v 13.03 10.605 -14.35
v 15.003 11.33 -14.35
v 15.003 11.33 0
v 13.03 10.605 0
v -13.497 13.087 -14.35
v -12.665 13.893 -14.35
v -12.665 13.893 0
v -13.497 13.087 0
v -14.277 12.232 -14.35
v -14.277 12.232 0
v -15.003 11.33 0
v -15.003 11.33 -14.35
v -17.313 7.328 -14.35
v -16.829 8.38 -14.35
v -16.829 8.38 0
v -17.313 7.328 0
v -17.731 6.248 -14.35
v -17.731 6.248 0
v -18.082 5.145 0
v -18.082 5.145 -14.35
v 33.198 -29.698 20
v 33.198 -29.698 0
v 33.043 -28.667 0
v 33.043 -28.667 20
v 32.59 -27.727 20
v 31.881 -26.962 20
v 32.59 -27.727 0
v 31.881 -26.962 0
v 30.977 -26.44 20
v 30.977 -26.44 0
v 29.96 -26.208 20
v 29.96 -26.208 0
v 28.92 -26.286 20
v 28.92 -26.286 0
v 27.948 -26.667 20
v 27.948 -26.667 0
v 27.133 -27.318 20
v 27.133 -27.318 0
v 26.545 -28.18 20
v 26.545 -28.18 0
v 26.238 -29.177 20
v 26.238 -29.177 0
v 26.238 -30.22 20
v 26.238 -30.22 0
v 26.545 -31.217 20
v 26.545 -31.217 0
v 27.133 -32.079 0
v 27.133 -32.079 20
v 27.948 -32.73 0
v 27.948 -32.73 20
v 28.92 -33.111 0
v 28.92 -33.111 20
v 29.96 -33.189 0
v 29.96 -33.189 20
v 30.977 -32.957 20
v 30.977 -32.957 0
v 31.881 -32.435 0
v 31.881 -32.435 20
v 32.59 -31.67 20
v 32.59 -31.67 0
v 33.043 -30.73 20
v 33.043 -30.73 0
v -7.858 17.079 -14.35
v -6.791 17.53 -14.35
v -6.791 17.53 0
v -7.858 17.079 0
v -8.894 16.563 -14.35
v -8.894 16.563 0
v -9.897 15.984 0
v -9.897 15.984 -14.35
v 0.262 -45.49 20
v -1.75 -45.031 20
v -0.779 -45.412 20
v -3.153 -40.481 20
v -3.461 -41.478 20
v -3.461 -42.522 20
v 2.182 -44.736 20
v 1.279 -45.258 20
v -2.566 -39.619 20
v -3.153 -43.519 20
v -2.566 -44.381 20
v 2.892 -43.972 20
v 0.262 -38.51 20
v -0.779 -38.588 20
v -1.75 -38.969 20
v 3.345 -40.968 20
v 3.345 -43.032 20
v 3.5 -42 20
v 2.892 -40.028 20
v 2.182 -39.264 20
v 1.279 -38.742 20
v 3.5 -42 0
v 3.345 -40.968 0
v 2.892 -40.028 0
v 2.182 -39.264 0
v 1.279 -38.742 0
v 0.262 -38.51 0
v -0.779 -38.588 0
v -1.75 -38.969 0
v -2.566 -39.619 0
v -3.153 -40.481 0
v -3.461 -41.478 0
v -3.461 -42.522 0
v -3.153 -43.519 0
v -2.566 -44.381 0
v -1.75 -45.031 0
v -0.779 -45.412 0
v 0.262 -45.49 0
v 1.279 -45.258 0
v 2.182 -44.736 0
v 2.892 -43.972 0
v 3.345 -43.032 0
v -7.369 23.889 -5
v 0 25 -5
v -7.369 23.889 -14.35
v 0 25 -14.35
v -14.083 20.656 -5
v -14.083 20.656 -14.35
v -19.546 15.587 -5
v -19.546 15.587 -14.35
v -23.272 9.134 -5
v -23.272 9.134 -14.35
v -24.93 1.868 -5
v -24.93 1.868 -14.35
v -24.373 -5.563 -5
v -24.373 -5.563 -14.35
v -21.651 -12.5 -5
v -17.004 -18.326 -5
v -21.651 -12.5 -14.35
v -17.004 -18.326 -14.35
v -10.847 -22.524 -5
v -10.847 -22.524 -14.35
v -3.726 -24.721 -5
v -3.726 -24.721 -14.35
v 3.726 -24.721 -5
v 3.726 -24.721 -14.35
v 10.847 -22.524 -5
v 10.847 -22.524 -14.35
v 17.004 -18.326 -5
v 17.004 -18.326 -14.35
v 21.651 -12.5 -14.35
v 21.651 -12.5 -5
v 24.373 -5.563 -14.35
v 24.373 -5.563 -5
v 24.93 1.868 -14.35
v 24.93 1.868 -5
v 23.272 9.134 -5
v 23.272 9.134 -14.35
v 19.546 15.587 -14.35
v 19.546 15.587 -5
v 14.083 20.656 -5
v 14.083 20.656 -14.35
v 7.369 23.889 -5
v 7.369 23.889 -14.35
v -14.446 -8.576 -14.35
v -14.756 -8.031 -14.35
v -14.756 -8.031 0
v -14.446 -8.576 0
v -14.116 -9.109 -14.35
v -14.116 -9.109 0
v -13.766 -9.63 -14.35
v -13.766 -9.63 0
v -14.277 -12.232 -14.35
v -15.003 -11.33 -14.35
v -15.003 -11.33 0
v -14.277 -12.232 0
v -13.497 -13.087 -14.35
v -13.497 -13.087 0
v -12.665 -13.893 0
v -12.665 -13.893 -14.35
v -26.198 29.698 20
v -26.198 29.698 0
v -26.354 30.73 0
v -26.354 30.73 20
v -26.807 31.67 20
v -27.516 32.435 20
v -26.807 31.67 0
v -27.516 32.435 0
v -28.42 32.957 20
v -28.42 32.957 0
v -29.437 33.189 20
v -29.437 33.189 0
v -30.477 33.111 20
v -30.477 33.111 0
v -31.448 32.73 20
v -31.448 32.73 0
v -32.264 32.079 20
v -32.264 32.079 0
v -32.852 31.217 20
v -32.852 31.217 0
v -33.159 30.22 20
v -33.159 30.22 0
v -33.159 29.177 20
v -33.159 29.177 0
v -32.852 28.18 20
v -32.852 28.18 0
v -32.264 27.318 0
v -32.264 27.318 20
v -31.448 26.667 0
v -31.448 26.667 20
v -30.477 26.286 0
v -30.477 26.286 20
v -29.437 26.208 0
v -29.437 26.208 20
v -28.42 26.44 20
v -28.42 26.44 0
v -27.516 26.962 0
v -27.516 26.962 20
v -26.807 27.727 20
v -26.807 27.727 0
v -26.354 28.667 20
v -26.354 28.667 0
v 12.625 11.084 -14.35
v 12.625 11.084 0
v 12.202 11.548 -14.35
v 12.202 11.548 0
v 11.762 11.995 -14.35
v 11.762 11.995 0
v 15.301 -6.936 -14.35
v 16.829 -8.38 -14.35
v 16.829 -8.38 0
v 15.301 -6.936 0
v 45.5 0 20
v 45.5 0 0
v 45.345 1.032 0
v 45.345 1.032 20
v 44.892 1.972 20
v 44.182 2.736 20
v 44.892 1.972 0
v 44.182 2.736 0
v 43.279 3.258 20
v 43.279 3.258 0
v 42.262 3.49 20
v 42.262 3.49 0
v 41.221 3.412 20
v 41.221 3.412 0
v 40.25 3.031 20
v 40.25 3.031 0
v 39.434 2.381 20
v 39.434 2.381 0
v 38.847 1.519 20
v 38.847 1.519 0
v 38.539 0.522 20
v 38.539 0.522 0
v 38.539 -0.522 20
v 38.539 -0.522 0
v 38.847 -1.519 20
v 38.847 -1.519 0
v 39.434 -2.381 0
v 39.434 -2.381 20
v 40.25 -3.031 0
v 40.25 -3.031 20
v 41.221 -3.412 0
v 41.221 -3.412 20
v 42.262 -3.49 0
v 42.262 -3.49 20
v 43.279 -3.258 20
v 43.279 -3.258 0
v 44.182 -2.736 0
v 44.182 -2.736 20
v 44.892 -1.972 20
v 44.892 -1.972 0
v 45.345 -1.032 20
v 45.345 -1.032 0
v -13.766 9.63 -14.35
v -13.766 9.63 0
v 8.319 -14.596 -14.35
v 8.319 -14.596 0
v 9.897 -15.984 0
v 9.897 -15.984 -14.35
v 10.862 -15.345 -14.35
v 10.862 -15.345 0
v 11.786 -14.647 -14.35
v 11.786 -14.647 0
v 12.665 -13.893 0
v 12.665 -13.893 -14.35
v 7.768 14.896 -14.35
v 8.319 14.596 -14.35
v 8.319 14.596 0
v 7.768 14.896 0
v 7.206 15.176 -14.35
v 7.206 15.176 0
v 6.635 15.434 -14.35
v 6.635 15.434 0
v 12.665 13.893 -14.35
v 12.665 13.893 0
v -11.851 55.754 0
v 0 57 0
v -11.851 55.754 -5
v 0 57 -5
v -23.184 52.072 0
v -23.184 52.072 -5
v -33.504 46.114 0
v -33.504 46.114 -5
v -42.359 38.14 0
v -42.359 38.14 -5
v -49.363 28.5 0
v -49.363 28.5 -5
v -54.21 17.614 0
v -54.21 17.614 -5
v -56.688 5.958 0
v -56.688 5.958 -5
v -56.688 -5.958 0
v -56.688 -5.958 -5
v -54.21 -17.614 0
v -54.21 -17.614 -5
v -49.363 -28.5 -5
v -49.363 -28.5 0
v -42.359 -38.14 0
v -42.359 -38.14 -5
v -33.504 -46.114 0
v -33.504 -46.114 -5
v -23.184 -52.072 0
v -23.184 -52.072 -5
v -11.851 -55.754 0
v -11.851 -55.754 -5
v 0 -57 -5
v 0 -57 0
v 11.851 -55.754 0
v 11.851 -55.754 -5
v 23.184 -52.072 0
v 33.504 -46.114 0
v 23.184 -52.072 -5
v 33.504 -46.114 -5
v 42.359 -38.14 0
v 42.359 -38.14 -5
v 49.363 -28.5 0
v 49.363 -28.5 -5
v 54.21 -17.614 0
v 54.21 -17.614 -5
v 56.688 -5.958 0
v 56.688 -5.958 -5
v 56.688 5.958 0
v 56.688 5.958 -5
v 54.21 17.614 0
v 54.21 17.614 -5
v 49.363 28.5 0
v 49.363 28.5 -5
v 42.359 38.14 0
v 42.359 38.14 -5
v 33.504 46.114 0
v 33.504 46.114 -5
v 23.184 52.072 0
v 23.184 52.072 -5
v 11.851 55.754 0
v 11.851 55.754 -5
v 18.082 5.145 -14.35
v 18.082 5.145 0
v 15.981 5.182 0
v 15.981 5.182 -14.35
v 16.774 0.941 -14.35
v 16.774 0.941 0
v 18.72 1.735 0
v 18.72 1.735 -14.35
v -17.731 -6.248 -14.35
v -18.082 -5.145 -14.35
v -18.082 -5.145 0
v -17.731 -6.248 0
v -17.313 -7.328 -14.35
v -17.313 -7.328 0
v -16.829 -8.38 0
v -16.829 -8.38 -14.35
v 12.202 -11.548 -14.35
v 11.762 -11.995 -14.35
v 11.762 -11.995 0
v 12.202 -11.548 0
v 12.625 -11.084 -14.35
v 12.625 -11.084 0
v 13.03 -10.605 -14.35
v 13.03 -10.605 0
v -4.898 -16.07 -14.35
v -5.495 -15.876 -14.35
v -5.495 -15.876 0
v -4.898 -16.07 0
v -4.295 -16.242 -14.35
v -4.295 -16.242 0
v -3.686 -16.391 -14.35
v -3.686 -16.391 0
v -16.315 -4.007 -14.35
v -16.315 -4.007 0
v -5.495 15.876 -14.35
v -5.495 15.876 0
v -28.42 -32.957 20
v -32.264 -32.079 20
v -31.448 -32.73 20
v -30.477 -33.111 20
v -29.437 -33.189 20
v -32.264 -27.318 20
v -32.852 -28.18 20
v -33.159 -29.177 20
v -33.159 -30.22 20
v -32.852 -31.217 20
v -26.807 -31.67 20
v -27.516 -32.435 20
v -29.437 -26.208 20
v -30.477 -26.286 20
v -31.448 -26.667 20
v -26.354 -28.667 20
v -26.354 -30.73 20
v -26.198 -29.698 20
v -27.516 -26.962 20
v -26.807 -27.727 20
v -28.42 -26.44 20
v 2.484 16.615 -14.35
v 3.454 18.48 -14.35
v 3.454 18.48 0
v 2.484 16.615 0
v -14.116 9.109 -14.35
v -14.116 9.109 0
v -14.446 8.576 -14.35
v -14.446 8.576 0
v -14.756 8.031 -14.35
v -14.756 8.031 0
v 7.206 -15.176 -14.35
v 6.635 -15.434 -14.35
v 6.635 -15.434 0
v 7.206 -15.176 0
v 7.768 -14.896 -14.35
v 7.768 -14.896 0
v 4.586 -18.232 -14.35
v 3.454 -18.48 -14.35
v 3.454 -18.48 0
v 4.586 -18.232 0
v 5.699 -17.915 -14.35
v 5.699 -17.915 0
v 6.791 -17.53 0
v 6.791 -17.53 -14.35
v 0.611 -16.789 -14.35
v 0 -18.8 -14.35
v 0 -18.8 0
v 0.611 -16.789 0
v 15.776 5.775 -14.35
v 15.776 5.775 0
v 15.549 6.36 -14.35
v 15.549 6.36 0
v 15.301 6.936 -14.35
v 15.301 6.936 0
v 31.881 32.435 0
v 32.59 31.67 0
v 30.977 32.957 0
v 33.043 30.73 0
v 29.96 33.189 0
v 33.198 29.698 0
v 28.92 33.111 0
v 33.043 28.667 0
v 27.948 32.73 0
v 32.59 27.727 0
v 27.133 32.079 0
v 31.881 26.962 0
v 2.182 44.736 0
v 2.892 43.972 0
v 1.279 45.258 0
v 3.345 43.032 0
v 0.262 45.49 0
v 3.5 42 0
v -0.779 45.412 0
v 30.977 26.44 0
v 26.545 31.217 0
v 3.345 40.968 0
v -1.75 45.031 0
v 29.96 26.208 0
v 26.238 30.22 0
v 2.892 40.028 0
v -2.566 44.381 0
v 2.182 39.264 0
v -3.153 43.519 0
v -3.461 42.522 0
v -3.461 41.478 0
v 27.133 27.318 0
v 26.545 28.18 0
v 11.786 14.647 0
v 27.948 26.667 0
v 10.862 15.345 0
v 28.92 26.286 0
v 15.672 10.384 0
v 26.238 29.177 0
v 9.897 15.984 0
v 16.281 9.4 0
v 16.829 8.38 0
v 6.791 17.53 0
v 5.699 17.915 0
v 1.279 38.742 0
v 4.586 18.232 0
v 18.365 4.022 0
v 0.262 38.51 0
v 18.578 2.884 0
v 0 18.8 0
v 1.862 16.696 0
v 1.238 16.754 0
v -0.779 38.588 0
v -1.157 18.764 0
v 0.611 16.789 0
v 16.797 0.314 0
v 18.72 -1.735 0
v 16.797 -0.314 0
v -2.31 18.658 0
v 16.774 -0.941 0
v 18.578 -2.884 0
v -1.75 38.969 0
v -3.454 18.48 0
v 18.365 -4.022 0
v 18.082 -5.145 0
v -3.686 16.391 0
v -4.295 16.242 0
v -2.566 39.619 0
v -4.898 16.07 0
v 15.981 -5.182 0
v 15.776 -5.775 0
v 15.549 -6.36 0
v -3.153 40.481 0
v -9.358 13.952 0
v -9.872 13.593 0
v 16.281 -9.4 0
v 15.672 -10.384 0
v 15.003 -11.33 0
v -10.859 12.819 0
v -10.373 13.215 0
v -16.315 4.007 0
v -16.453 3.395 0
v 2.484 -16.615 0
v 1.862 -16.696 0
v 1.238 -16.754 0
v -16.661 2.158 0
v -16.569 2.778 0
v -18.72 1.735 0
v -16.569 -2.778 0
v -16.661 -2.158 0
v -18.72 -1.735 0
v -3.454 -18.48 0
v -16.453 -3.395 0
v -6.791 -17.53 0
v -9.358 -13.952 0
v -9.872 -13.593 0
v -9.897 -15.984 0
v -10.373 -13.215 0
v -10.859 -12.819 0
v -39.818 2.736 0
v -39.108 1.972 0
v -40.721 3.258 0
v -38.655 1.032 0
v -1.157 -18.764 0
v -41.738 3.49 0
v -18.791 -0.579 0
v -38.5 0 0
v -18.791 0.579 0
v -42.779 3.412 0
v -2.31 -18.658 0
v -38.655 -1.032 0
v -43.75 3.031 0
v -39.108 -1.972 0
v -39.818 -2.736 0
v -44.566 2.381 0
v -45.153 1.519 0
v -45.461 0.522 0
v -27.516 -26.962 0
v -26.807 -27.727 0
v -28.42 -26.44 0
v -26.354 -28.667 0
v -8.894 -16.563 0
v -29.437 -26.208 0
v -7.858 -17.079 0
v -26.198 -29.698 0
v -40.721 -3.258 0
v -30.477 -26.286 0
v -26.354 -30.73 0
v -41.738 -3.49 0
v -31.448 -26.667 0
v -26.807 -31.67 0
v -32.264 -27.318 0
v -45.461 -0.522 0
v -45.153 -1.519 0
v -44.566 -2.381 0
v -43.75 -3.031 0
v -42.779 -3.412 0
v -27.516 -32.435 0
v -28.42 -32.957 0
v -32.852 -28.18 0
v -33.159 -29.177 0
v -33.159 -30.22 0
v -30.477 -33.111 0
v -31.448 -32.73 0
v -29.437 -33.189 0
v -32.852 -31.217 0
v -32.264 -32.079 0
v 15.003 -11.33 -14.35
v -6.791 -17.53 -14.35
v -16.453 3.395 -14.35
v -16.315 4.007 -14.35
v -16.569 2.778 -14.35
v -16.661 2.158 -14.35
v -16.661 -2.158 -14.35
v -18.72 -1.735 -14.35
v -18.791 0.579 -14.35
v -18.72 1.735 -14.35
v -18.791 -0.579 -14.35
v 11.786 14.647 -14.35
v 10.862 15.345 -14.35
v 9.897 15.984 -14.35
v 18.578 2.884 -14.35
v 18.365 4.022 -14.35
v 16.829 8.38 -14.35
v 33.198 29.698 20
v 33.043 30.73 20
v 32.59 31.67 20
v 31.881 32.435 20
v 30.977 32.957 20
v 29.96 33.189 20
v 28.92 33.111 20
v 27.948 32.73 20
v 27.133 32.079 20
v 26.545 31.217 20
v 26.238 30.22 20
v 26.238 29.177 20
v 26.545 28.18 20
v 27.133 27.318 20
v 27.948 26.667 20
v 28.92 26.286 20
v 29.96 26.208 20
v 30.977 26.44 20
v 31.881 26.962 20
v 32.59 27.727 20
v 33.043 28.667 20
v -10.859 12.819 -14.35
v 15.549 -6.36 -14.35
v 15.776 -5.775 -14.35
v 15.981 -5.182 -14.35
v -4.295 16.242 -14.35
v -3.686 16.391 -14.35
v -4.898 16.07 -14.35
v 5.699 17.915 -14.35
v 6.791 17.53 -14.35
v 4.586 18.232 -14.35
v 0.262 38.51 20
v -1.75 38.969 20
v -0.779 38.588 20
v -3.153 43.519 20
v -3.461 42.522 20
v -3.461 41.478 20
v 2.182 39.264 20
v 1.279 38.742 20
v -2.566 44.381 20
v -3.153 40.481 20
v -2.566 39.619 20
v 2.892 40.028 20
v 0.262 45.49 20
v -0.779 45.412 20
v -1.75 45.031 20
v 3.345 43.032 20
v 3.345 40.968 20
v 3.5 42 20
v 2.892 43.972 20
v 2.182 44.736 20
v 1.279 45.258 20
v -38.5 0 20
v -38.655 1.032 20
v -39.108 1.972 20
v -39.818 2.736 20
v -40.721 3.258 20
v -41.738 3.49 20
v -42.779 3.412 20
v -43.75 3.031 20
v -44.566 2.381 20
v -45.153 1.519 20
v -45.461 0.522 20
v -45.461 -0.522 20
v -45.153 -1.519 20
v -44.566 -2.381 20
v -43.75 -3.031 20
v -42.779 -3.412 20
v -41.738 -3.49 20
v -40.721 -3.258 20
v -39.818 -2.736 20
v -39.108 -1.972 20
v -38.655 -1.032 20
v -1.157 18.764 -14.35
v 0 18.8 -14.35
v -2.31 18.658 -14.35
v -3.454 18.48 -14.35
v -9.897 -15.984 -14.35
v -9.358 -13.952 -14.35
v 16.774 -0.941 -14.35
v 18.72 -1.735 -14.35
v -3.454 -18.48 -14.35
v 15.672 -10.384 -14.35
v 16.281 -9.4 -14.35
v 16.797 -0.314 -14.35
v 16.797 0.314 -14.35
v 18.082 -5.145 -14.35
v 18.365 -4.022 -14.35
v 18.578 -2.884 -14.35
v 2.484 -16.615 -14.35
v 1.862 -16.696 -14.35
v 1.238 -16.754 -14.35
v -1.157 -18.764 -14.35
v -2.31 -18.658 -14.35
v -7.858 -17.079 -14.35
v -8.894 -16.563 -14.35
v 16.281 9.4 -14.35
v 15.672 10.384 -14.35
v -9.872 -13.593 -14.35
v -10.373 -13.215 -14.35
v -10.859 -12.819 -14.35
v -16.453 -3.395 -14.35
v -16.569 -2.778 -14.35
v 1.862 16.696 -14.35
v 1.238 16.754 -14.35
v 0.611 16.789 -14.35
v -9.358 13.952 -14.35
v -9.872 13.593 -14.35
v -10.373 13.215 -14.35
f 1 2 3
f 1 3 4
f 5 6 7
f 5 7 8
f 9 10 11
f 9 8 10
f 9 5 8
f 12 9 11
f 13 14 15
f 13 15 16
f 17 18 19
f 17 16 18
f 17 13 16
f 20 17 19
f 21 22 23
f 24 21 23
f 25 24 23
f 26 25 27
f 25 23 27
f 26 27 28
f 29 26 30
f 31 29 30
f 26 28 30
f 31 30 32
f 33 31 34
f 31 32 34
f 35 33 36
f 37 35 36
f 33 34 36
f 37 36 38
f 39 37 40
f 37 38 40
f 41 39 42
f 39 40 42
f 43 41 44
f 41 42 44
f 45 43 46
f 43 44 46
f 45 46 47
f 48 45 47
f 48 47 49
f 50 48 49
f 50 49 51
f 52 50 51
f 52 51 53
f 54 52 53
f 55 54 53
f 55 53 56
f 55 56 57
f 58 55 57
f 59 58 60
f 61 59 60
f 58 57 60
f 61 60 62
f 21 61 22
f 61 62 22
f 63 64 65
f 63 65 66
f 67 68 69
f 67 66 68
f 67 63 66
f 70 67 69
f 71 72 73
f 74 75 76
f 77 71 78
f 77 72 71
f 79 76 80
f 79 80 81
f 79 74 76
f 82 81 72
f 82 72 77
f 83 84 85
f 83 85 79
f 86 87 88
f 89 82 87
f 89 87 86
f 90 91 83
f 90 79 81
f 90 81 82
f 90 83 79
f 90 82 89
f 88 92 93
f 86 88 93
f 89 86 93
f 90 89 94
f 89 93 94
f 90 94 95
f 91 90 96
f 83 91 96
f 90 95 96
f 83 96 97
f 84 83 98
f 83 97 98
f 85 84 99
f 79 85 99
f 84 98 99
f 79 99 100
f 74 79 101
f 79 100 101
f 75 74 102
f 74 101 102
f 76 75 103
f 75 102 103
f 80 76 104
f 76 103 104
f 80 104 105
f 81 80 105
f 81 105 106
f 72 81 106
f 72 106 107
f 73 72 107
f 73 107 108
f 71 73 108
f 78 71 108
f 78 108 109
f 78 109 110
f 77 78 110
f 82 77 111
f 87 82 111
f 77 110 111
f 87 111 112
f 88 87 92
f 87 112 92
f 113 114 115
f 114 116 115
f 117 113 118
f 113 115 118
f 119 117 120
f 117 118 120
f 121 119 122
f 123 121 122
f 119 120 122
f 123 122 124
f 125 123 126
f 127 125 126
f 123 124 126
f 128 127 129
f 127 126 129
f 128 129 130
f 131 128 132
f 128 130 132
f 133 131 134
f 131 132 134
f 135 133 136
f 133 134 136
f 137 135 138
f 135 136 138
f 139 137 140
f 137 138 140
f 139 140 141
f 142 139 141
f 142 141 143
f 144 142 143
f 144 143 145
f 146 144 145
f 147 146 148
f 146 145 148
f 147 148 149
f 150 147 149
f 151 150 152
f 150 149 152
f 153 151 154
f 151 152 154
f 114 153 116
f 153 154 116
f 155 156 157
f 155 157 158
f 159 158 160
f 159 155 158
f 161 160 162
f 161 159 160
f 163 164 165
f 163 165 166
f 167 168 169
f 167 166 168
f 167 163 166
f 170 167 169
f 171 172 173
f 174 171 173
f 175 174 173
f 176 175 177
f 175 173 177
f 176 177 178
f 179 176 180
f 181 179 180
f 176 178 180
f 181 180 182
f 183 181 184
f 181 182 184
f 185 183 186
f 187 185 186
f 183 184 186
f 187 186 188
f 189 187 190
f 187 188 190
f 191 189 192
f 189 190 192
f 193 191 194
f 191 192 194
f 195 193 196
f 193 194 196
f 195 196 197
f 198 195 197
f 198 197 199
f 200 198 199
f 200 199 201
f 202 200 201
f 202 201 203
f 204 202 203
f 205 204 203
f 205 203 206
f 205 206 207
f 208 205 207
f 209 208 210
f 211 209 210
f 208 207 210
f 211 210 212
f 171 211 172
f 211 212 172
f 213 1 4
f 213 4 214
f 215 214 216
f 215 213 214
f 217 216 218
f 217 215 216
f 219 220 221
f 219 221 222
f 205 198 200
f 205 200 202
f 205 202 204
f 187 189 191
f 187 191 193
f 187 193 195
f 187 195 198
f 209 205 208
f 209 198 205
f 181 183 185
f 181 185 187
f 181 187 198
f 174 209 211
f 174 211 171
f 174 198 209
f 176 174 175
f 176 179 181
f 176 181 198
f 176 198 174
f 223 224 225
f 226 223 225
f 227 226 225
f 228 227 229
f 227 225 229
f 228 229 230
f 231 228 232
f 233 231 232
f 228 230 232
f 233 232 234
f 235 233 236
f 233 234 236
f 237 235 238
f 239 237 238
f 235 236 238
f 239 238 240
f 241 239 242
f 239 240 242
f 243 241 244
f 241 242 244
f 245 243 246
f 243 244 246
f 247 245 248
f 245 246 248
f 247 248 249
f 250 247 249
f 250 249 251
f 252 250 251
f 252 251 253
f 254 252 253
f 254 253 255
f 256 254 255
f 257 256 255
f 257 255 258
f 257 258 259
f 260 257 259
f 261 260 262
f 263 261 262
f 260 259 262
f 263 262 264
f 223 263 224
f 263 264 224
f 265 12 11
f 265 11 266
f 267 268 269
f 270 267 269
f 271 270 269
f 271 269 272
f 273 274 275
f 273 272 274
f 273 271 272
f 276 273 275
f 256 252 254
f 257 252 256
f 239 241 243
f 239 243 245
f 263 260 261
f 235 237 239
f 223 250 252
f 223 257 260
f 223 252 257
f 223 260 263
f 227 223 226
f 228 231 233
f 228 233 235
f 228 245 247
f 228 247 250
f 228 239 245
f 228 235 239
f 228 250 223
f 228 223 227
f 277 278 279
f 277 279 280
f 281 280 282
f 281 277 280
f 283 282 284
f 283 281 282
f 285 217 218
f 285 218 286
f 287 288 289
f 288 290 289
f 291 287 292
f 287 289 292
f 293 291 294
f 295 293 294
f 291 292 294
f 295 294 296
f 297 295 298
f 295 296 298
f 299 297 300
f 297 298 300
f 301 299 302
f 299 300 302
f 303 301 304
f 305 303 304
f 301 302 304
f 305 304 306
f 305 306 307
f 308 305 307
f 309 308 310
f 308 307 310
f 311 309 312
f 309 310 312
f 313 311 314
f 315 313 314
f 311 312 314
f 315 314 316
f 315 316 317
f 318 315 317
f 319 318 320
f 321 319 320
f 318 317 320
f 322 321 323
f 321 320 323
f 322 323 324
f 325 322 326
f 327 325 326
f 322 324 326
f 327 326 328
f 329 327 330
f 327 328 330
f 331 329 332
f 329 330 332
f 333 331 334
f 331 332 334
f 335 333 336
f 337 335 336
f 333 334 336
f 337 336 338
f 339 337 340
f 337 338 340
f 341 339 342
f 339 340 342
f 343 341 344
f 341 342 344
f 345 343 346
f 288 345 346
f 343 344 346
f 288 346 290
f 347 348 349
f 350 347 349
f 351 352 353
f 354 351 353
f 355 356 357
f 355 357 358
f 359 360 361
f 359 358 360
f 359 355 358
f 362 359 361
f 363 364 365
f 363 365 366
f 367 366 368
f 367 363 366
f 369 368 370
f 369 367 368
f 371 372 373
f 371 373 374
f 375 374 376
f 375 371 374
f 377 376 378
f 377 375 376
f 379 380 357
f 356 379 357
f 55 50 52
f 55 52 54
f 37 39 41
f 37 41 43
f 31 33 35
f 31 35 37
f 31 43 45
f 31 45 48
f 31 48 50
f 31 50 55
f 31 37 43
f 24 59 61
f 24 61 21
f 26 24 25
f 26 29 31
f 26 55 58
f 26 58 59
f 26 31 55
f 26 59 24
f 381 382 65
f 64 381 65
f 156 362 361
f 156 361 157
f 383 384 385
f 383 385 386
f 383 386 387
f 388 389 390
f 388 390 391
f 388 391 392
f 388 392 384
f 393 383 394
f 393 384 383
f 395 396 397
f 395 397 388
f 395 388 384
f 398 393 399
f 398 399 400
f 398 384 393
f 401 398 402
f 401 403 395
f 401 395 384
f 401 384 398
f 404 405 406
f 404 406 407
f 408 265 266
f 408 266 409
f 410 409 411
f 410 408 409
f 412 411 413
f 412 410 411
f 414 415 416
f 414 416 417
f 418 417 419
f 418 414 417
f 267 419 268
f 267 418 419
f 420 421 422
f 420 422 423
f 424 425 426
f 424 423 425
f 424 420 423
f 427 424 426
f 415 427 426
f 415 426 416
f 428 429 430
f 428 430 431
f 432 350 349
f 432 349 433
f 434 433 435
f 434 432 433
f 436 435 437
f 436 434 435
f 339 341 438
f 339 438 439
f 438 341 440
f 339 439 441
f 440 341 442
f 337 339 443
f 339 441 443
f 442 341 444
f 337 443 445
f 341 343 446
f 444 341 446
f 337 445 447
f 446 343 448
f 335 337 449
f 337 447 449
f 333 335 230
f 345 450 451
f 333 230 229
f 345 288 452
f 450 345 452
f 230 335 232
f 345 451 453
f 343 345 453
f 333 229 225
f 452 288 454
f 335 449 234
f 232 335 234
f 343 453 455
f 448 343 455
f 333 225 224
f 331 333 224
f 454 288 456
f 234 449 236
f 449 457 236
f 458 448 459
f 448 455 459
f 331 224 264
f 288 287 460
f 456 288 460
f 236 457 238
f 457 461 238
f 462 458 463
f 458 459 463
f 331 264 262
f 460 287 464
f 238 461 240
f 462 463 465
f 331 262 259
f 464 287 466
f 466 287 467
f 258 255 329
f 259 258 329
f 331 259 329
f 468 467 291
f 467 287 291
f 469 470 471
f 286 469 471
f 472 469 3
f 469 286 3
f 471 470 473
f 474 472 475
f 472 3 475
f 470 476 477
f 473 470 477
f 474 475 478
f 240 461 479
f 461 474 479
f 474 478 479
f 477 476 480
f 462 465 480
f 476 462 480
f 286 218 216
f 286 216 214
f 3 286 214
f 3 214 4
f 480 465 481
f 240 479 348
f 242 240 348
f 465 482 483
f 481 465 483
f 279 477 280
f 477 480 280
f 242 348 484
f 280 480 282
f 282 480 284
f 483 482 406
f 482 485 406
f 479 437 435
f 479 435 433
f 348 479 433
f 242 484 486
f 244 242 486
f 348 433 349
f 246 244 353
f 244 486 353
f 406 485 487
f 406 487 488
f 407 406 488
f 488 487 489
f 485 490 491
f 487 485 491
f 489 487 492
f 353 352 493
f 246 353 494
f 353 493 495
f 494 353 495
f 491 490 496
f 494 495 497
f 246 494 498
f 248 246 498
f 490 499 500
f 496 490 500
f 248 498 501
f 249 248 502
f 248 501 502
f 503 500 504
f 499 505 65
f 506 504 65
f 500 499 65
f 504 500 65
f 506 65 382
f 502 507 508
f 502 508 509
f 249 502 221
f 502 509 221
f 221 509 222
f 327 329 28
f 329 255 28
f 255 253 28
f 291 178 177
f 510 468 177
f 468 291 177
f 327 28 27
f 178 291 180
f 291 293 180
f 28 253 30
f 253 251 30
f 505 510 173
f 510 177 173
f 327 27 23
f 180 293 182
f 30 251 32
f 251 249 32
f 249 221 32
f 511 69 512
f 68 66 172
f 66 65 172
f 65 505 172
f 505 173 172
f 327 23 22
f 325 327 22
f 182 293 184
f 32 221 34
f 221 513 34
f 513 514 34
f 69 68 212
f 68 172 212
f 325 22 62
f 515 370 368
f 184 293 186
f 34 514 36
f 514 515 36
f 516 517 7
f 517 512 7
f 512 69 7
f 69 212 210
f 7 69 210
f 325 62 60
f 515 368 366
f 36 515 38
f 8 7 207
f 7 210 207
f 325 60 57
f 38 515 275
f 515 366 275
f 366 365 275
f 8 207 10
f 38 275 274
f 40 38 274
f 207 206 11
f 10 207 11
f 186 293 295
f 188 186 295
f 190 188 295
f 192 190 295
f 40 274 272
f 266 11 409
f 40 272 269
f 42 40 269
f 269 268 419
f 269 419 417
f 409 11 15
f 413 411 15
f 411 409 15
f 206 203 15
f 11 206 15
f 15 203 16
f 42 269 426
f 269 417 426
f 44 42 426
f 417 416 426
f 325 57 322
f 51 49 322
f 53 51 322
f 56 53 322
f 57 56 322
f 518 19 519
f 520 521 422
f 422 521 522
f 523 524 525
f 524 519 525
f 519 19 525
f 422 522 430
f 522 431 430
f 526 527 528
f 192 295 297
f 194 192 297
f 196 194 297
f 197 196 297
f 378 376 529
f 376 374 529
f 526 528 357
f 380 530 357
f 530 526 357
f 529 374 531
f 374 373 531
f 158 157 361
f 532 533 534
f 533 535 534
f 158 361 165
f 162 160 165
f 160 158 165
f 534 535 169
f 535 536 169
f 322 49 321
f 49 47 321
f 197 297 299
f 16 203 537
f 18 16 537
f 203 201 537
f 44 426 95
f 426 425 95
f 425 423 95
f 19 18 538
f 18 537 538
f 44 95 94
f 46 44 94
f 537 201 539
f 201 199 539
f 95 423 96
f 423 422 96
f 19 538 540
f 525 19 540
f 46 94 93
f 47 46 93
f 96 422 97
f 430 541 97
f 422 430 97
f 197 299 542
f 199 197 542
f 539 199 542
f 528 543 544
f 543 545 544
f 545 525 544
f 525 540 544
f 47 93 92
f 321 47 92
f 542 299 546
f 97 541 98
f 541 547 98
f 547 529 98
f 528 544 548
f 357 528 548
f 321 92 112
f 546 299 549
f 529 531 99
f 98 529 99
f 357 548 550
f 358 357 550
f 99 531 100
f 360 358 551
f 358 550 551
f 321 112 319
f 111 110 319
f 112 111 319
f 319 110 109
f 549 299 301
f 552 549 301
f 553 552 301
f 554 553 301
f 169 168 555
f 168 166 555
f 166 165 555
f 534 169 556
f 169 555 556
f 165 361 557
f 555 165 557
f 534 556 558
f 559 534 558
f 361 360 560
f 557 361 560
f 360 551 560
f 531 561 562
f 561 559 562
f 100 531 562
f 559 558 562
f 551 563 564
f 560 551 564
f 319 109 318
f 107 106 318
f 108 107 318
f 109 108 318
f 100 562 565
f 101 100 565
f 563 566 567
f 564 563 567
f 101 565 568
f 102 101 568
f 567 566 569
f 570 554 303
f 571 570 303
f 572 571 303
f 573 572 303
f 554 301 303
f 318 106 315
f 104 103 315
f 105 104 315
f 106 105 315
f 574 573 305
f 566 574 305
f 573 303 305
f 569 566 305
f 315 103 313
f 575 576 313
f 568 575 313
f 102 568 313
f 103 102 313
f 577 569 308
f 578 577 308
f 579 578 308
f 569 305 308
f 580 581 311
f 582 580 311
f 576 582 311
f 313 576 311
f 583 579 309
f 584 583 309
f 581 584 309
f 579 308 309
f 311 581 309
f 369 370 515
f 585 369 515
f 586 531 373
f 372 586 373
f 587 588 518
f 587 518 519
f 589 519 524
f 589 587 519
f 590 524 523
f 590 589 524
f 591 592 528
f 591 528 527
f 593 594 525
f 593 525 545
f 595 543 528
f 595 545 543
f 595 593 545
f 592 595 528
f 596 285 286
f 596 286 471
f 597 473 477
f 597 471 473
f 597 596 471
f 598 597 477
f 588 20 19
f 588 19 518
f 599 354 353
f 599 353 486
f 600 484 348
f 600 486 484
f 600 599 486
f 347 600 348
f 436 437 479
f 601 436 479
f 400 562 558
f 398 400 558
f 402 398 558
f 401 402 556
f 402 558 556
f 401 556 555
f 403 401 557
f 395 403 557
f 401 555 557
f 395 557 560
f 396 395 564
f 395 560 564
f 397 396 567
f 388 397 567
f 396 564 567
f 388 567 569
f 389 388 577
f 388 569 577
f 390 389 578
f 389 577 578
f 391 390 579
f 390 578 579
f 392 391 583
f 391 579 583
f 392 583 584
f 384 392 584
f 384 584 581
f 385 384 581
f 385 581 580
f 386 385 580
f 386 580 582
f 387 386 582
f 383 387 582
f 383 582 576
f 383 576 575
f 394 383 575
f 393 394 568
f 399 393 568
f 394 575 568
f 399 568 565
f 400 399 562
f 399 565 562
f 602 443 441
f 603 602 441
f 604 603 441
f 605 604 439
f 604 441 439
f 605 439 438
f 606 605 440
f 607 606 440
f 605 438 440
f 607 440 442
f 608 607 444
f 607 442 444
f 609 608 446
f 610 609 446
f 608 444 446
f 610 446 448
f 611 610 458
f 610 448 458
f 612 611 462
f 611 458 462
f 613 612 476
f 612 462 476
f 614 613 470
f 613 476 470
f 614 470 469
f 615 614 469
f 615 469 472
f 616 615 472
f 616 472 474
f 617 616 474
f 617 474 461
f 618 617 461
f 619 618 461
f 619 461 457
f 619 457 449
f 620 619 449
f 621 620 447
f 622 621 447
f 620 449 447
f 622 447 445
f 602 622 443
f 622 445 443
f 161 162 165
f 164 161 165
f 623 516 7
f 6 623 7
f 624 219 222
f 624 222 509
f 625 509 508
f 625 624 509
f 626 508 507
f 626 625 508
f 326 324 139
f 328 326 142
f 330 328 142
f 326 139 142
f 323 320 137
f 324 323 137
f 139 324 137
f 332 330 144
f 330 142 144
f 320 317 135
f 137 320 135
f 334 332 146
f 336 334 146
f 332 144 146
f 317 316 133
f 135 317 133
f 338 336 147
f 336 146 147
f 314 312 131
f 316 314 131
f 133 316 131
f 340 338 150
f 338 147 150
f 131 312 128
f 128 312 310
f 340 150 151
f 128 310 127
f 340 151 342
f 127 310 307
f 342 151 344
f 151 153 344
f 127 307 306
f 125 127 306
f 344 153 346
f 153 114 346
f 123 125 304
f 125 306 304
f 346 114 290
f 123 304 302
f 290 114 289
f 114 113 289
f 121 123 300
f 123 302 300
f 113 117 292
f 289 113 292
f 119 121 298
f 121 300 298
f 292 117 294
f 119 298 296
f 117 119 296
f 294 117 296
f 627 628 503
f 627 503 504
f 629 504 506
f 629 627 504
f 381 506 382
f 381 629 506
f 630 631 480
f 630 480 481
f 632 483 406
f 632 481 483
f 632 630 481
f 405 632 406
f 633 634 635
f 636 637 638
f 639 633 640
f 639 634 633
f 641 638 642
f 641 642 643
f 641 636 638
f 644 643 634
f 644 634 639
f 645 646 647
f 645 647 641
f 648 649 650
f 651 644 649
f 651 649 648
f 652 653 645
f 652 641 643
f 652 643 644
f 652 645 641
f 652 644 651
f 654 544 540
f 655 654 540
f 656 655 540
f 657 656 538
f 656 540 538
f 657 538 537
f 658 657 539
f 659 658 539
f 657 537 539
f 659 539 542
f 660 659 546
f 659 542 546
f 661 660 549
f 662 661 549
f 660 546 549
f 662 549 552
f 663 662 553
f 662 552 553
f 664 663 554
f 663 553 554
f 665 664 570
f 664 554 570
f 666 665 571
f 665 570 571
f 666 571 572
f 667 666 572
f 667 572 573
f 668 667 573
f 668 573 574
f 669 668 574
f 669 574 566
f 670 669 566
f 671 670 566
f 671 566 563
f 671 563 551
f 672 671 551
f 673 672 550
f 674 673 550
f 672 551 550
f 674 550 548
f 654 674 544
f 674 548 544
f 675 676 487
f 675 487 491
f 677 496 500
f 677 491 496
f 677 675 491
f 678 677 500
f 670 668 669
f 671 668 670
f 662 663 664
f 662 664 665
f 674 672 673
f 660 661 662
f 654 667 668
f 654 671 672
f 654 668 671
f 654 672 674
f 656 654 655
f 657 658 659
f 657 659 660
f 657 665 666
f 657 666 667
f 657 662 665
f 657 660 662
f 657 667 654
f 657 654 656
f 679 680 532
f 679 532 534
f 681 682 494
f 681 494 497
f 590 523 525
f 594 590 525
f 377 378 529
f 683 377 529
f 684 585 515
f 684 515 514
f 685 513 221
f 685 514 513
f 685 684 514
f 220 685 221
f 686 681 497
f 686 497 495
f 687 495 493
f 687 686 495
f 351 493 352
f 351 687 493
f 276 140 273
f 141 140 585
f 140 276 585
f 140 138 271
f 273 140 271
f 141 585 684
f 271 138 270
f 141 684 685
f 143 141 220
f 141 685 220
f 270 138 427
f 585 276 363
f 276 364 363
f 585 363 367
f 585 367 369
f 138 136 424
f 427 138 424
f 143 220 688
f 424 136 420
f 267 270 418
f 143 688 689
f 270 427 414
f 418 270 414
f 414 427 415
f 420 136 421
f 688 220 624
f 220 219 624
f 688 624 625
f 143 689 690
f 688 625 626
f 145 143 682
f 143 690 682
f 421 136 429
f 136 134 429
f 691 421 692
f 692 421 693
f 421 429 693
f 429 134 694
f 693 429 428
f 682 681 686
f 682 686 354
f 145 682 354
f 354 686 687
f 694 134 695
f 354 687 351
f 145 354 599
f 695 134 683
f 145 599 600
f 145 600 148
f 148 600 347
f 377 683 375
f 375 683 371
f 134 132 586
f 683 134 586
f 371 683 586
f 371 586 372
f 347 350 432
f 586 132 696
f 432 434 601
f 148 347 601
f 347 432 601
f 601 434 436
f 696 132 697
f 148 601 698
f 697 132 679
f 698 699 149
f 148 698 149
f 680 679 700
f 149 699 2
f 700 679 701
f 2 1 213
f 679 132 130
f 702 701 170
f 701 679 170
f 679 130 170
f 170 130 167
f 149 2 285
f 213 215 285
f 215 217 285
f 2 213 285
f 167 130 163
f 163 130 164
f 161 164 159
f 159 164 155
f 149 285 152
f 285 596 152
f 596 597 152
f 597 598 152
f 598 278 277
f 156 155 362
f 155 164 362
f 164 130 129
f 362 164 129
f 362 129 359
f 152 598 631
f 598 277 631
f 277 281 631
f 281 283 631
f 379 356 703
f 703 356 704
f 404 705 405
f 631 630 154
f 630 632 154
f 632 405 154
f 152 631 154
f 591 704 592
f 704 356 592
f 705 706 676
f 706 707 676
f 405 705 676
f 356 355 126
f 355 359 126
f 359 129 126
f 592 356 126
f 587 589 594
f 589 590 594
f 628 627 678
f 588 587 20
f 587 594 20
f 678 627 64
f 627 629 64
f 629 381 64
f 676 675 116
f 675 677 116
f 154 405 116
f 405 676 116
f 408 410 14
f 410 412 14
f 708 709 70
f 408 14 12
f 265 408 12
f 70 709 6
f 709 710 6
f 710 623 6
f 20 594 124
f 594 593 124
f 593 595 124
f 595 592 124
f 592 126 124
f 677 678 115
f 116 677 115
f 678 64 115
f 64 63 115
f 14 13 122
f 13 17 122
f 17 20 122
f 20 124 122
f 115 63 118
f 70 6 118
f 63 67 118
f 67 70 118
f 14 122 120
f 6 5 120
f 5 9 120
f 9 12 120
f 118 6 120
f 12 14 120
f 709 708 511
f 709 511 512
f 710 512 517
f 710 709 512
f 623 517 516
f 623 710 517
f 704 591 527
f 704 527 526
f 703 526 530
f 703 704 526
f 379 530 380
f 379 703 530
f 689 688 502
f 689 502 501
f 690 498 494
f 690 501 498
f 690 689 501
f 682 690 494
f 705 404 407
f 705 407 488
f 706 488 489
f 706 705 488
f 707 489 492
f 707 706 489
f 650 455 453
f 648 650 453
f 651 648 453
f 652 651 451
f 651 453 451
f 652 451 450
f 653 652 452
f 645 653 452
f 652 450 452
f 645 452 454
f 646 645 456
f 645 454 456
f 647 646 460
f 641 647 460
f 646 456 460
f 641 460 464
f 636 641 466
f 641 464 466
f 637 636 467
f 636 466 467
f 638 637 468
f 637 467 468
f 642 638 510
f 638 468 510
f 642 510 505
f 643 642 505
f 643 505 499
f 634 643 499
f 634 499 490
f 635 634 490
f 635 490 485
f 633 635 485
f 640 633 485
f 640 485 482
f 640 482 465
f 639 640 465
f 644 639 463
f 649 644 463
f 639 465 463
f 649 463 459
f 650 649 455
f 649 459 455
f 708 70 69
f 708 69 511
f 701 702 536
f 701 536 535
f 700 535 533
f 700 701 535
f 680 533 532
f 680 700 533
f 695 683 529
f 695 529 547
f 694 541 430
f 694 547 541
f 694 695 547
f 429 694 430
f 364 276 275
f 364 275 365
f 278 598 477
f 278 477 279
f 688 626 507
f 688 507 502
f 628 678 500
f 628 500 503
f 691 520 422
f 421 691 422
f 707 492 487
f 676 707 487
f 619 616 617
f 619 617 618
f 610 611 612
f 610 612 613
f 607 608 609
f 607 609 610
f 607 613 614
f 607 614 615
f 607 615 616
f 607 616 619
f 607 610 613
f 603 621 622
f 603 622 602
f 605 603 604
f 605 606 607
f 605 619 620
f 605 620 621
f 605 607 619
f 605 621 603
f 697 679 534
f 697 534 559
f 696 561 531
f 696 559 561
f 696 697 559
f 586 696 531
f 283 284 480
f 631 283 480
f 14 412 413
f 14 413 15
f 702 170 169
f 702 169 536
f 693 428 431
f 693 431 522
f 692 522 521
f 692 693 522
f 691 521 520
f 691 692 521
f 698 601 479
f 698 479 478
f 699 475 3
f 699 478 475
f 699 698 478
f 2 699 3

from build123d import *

# Parameters (mm, degrees)
CUT_EXTRUDE1_DEPTH  = 15.35
CIRPATTERN1_COUNT   = 17
SKETCH3_R           = 3.5
BOSS_EXTRUDE1_DEPTH = 20


with BuildPart() as part:
    # Sketch1 → Revolve1 (revolve)
    with BuildSketch(Plane(origin=(0, 0, 0), x_dir=(0, 0, -1), z_dir=(1, 0, 0))):
        Polygon((0, 0), (0, 57), (5, 57), (5, 25.000000038), (14.35, 25.000000038), (14.35, 0), align=None)
    revolve(axis=Axis((0, 0, -14.35), (0, 0, 1)))

    # Sketch2 → Cut-Extrude1 (cut, through all)
    with BuildSketch(Plane(origin=(0, 0, -14.35), x_dir=(-1, 0, 0), z_dir=(0, 0, -1))):
        with BuildLine():
            Line((0, 0), (0, 18.8))
            ThreePointArc((0, 18.8), (1.734645158, 18.719802514), (3.454490935, 18.479894274))
            Line((3.454490935, 18.479894274), (3.685673166, 16.390723392))
            ThreePointArc((3.685673166, 16.390723392), (4.597538233, 16.158670805), (5.494981484, 15.875930791))
            Line((5.494981484, 15.875930791), (6.791343324, 17.530477913))
            Line((6.791343324, 17.530477913), (0, 0))
        make_face()
    cut_extrude1 = extrude(amount=-CUT_EXTRUDE1_DEPTH, mode=Mode.SUBTRACT)

    # CirPattern1: Cut-Extrude1 ×17 about axis
    cirpattern1_axis = Axis((0, 0, 0), (0, 0, 1))
    for i in range(1, CIRPATTERN1_COUNT):
        add(cut_extrude1.rotate(cirpattern1_axis, i * 360 / CIRPATTERN1_COUNT), mode=Mode.SUBTRACT)

    # Sketch3 → Boss-Extrude1 (add)
    with BuildSketch(Plane.XY):
        with Locations((0, 42)):
            Circle(SKETCH3_R)
        with Locations((29.69848481, 29.69848481)):
            Circle(SKETCH3_R)
        with Locations((42, 0)):
            Circle(SKETCH3_R)
        with Locations((29.69848481, -29.69848481)):
            Circle(SKETCH3_R)
        with Locations((0, -42)):
            Circle(SKETCH3_R)
        with Locations((-29.69848481, -29.69848481)):
            Circle(SKETCH3_R)
        with Locations((-42, 0)):
            Circle(SKETCH3_R)
        with Locations((-29.69848481, 29.69848481)):
            Circle(SKETCH3_R)
    extrude(amount=BOSS_EXTRUDE1_DEPTH)


solid = part.part
